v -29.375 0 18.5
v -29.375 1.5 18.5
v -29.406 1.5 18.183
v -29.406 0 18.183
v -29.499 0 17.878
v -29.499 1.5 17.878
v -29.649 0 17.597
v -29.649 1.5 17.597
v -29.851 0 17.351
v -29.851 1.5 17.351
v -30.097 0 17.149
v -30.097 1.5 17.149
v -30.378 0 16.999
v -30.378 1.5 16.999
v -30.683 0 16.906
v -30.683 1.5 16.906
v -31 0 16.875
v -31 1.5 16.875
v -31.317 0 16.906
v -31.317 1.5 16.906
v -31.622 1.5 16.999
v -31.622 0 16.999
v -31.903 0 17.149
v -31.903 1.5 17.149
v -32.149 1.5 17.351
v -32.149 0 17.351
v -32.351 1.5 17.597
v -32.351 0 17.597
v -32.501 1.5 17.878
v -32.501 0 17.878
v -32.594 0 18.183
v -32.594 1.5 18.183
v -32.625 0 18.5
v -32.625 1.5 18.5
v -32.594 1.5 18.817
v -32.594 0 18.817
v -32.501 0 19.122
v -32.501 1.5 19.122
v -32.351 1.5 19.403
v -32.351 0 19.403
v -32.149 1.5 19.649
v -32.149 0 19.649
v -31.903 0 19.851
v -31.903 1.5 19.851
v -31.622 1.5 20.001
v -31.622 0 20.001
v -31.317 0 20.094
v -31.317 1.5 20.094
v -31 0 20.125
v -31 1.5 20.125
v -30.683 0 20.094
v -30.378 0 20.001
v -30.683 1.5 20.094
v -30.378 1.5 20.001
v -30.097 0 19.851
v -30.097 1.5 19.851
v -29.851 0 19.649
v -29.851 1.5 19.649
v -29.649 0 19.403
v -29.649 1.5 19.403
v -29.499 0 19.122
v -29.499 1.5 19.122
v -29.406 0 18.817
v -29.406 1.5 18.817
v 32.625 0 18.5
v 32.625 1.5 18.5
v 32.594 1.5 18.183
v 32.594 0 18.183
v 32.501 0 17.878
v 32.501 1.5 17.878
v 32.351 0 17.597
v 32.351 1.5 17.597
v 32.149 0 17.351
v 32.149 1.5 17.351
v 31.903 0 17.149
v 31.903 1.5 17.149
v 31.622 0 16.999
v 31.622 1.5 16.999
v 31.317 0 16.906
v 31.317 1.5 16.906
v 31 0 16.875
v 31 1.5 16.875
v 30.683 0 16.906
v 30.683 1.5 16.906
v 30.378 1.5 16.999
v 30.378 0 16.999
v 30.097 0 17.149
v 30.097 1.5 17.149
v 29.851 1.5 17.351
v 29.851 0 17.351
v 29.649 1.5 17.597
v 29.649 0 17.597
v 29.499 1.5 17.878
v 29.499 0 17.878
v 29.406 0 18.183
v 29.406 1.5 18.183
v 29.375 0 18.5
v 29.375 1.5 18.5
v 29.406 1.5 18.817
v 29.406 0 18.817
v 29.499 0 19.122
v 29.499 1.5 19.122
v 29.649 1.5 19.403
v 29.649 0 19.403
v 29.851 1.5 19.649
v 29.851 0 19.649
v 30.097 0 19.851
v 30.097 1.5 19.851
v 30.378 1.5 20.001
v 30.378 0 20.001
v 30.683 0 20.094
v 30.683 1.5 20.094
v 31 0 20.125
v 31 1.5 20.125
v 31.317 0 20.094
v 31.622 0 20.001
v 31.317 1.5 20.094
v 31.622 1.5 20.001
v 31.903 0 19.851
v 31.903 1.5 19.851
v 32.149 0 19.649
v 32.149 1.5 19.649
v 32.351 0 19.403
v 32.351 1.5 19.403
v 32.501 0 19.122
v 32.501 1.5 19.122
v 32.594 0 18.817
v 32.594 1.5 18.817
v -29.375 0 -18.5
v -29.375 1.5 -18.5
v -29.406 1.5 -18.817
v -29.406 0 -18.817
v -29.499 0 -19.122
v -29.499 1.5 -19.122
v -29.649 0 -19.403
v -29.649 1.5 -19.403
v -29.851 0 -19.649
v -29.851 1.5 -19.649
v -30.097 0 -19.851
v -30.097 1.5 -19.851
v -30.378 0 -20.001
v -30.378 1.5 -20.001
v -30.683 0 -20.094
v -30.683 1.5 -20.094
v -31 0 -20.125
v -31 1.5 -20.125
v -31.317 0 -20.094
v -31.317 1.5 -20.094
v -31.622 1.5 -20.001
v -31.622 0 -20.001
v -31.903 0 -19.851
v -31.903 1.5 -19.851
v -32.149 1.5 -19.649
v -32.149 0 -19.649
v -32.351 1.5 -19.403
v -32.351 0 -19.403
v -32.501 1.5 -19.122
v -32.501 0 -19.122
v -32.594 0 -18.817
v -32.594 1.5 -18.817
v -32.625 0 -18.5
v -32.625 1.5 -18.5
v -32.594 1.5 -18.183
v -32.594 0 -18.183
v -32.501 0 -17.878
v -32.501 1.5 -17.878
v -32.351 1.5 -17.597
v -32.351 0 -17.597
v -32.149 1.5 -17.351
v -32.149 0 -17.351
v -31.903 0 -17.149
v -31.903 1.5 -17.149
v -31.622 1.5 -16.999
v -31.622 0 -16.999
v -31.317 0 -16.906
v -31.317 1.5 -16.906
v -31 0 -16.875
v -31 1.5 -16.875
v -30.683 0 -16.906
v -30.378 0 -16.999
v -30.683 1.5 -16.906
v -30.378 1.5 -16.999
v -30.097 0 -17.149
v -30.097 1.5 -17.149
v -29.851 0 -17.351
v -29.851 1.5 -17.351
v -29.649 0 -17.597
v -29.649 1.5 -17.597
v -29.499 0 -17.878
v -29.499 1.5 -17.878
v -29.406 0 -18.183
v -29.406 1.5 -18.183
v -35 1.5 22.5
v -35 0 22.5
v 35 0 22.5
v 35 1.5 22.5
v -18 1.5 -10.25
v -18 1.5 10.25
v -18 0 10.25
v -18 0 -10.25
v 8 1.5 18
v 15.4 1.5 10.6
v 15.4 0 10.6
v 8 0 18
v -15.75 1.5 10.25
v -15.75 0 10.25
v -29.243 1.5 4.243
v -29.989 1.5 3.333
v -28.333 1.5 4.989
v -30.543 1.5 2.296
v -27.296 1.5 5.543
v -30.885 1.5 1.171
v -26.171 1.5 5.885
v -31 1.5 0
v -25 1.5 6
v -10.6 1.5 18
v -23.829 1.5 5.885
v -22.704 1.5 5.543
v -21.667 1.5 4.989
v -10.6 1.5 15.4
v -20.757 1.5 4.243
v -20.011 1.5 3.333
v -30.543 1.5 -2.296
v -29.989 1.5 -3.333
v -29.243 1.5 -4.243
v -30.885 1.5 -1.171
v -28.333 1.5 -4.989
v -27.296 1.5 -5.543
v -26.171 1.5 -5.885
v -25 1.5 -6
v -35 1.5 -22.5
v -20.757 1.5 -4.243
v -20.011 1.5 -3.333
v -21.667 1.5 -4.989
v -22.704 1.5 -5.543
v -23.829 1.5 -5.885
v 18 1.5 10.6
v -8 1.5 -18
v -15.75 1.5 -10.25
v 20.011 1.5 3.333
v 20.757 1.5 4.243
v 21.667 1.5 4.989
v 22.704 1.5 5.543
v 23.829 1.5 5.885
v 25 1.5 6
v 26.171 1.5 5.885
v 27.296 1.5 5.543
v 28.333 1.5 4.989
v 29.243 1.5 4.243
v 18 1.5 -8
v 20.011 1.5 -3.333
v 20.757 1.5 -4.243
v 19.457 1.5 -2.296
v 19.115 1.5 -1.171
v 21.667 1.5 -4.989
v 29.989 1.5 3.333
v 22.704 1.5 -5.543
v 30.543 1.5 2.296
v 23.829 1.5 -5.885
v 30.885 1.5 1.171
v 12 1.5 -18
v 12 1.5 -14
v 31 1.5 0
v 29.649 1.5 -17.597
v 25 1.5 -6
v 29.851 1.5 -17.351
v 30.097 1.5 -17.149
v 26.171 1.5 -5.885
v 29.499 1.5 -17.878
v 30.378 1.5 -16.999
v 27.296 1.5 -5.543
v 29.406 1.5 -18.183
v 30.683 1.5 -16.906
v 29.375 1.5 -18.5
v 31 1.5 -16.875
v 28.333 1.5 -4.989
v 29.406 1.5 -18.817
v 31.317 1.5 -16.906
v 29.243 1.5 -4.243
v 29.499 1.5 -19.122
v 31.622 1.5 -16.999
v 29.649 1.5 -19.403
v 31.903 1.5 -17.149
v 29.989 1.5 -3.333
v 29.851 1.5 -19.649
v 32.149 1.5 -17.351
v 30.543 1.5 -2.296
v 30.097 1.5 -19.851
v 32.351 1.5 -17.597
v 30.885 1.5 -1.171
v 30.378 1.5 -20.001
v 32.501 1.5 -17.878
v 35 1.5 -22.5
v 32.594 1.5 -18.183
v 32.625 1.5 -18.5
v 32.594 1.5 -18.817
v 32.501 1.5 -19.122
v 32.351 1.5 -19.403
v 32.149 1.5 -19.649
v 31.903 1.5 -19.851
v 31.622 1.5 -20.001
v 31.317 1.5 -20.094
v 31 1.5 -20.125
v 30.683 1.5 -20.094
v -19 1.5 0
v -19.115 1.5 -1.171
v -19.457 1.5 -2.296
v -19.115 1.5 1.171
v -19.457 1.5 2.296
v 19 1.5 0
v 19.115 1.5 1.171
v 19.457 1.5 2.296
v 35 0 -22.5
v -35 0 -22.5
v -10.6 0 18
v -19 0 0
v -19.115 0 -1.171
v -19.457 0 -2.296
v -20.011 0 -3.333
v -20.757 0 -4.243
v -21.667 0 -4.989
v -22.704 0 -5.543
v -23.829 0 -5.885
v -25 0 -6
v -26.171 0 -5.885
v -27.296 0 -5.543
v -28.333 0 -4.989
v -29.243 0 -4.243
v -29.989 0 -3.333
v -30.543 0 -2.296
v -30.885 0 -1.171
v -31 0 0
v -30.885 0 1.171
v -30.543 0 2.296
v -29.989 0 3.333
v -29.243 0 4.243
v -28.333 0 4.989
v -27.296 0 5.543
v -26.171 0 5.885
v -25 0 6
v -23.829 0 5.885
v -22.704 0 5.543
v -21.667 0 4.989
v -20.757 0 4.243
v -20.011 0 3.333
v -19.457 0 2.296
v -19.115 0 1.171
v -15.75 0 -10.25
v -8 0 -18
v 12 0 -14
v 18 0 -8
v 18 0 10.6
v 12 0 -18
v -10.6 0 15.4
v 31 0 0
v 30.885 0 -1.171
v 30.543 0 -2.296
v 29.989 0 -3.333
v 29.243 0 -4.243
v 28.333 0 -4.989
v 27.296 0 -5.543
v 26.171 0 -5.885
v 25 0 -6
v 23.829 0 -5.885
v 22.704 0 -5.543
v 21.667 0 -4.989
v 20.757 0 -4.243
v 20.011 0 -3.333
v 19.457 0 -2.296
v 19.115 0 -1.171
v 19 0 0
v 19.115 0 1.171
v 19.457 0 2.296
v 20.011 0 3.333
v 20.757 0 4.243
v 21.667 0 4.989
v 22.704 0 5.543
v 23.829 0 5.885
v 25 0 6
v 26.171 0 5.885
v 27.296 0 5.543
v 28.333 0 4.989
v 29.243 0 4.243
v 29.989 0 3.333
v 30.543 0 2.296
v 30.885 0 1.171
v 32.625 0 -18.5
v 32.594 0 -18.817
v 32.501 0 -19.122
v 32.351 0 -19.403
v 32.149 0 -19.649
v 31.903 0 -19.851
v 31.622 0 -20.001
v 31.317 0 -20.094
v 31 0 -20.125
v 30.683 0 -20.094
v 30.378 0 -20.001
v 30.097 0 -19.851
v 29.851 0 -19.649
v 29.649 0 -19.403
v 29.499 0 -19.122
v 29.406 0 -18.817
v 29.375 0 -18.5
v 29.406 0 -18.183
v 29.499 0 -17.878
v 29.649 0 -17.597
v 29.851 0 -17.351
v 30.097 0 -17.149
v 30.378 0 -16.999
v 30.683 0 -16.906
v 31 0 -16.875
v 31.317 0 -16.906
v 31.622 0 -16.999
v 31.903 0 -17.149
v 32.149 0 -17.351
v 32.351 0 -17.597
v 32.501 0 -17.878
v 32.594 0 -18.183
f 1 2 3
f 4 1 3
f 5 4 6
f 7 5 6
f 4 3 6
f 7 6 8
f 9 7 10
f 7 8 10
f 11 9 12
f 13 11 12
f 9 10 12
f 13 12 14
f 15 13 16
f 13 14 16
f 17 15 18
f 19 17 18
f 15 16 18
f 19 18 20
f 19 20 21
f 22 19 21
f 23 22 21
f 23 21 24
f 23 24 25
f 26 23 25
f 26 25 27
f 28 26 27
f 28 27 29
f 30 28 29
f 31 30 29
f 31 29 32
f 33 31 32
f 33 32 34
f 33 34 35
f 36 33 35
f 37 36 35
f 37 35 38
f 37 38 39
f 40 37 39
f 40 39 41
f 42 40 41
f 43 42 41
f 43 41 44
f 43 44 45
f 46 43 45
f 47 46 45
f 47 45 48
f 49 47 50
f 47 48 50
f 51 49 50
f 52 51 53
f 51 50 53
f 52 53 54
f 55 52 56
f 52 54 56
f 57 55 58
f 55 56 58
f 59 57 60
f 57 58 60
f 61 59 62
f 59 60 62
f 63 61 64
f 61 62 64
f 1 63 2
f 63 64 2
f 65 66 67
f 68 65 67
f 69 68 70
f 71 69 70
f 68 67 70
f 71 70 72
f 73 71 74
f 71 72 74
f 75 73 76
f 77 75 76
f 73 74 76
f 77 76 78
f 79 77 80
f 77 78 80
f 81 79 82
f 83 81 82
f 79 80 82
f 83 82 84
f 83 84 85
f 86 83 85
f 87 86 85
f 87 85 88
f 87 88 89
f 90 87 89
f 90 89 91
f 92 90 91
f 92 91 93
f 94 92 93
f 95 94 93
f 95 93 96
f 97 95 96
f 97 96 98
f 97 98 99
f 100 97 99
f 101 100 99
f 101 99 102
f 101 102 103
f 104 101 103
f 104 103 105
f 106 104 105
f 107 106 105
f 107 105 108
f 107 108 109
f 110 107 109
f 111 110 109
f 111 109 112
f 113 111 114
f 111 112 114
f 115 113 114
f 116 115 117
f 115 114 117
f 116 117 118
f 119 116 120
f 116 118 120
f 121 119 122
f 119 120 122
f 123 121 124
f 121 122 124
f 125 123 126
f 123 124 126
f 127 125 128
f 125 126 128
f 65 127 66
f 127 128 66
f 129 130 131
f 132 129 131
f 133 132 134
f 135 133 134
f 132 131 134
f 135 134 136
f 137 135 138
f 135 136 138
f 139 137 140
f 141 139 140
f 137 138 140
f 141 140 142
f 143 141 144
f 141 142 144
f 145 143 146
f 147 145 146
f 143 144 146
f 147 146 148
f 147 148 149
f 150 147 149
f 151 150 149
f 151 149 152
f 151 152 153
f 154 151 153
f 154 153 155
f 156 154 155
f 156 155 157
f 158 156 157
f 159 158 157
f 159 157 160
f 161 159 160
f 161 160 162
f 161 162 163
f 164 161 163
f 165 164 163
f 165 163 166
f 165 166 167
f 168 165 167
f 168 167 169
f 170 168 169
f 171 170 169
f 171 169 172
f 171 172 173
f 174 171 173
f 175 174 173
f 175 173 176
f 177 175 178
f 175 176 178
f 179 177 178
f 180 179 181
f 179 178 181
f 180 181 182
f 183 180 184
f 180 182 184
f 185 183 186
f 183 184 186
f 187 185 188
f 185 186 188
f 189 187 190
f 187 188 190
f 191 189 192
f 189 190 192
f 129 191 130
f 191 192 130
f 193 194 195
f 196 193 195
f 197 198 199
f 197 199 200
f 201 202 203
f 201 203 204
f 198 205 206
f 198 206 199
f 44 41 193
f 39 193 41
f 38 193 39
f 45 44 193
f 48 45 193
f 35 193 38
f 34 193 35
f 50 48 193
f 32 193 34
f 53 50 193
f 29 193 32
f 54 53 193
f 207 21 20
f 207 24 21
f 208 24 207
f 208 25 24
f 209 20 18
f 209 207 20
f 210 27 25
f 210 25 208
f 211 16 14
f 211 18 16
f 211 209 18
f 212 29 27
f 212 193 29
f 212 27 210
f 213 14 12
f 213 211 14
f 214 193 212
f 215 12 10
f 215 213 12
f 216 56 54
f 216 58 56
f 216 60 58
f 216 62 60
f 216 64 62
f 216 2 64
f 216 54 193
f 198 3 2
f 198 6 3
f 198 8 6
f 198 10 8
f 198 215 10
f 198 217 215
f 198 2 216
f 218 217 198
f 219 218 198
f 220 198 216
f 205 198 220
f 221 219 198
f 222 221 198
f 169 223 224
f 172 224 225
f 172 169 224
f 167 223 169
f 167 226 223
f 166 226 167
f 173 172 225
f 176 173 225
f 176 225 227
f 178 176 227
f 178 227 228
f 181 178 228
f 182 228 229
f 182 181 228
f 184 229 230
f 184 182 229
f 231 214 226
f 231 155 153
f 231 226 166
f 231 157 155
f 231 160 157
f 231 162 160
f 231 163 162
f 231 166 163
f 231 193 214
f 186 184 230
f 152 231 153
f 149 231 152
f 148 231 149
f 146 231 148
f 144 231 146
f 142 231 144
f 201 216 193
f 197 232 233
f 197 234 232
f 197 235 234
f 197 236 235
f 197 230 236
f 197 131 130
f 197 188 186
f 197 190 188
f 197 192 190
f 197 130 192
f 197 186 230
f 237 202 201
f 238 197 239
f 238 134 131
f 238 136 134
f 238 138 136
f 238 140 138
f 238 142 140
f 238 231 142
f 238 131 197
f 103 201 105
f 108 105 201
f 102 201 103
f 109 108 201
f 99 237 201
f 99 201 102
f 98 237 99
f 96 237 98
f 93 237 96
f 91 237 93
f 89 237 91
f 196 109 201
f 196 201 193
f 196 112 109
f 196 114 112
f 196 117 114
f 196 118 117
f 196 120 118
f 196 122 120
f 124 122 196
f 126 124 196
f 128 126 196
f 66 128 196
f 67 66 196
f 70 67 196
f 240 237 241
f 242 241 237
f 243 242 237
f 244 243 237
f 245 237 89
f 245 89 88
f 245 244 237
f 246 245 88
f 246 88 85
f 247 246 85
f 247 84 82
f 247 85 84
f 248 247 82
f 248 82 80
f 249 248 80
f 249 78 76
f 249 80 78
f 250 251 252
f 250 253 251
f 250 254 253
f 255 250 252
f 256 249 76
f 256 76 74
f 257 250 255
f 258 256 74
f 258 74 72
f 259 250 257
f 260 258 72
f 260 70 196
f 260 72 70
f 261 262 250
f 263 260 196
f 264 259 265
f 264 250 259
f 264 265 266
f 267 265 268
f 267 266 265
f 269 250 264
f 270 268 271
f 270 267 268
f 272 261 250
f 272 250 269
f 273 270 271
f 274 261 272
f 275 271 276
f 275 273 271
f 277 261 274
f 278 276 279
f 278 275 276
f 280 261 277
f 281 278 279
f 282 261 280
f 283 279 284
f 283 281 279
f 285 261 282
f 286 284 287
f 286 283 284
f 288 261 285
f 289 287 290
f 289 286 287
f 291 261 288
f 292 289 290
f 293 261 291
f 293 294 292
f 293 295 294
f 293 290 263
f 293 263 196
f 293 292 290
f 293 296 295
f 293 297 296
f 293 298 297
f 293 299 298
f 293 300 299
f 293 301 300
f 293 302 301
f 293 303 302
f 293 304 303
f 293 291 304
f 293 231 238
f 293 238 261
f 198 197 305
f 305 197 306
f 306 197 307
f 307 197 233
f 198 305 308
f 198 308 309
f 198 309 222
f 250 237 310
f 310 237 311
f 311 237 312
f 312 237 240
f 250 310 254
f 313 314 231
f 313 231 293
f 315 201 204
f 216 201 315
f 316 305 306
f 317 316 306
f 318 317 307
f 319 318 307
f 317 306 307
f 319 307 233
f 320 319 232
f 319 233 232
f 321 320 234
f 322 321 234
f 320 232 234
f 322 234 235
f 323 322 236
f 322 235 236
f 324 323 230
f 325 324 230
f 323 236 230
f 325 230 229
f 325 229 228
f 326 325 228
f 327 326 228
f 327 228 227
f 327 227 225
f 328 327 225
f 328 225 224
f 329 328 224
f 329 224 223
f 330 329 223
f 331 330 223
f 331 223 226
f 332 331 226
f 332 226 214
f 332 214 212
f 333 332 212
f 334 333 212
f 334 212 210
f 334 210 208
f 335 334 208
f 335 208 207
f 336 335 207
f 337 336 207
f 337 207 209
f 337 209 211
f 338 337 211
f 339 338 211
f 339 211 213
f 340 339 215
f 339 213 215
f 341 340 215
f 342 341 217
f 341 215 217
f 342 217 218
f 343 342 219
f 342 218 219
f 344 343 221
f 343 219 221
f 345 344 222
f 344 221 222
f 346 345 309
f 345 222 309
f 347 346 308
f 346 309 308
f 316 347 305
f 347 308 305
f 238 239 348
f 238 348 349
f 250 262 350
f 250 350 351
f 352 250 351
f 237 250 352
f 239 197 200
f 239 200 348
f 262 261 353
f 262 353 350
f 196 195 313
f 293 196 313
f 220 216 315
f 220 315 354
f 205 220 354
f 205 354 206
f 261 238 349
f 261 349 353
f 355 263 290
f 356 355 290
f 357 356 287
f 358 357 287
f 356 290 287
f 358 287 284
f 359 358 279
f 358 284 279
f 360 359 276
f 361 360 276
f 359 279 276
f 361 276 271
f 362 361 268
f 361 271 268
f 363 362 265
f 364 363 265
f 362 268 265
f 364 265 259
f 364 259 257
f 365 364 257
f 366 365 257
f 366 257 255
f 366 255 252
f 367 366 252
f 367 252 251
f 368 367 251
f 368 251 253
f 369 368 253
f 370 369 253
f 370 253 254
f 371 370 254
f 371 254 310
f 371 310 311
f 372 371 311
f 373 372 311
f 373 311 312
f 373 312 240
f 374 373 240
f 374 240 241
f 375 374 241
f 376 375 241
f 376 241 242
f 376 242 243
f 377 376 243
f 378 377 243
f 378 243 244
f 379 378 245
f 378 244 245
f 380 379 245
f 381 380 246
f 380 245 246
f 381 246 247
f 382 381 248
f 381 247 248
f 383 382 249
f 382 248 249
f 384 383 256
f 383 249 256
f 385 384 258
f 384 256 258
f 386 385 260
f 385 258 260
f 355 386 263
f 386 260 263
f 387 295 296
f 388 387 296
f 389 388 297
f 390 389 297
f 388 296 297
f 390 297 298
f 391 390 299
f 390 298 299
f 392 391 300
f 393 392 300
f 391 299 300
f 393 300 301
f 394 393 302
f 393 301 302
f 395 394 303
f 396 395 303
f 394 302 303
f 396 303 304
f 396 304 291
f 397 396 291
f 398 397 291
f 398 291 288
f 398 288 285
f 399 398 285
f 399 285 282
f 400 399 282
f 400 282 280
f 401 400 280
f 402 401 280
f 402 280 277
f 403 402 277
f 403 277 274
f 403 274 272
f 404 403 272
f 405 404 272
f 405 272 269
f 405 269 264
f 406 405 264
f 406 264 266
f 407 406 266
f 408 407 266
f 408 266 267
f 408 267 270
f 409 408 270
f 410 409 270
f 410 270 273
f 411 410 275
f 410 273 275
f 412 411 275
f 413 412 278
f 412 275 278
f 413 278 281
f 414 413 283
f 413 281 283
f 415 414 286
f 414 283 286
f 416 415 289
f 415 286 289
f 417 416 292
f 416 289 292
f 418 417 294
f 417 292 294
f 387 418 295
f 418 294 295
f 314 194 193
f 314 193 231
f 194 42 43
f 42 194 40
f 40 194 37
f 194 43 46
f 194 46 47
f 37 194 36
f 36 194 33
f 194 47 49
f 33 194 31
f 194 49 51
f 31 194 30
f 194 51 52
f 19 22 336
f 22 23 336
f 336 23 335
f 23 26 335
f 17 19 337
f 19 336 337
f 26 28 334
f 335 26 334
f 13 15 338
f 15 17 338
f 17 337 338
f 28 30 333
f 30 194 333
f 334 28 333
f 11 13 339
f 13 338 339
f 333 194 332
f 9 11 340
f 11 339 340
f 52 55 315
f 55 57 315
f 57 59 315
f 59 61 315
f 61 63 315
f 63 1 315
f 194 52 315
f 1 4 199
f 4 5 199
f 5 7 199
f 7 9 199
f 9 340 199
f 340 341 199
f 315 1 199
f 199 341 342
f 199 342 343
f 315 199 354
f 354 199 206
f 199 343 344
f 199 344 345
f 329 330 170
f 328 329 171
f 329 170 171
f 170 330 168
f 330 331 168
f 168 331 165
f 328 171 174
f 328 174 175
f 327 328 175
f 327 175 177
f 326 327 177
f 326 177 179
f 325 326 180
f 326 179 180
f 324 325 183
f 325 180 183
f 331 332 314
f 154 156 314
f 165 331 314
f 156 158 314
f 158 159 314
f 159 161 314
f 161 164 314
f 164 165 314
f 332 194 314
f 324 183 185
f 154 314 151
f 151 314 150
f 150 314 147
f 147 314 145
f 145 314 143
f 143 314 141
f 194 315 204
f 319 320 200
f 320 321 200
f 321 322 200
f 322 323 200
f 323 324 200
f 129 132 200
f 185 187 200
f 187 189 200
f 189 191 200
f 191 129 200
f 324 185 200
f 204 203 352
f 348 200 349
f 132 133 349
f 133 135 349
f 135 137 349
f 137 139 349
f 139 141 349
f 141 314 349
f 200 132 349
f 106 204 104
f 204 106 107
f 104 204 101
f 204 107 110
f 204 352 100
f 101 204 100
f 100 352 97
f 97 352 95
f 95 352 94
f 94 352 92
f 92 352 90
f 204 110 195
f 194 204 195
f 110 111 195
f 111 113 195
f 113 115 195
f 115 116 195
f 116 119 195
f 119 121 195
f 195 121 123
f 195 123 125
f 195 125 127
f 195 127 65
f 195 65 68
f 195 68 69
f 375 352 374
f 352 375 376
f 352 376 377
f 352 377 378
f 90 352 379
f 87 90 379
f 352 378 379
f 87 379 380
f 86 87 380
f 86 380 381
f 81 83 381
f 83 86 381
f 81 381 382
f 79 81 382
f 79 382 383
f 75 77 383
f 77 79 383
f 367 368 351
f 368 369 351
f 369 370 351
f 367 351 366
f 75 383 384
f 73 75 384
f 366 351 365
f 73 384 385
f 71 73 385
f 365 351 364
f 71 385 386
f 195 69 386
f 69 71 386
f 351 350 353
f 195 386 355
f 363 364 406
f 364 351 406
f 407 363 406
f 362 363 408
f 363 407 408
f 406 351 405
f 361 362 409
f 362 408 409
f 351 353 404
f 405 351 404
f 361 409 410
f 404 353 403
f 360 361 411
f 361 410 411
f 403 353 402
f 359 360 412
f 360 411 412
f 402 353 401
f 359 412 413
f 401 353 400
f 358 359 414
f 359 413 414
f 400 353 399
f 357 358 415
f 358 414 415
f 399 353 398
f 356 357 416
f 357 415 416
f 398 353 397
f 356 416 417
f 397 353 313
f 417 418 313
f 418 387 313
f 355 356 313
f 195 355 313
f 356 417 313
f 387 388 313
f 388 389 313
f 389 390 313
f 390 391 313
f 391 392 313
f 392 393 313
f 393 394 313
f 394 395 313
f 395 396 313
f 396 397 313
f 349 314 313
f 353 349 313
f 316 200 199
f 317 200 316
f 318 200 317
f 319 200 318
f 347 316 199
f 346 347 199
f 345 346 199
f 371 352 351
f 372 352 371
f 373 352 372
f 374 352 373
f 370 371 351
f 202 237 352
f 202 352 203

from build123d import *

# Parameters (mm, degrees)
SKETCH2_W           = 70
SKETCH2_H           = 45
BOSS_EXTRUDE1_DEPTH = 1.5
SKETCH3_R           = 1.625
SKETCH3_R_2         = 6
CUT_EXTRUDE1_DEPTH  = 2.5
CUT_EXTRUDE2_DEPTH  = 2.5


with BuildPart() as part:
    # Sketch2 → Boss-Extrude1 (new body)
    with BuildSketch(Plane(origin=(0, 0, 0), x_dir=(1, 0, 0), z_dir=(0, 1, 0))):
        Rectangle(SKETCH2_W, SKETCH2_H)
    extrude(amount=BOSS_EXTRUDE1_DEPTH)

    # Sketch3 → Cut-Extrude1 (cut, through all)
    with BuildSketch(Plane(origin=(0, 1.5, 0), x_dir=(1, 0, 0), z_dir=(0, 1, 0))):
        with Locations((-31, -18.5)):
            Circle(SKETCH3_R)
        with Locations((-31, 18.5)):
            Circle(SKETCH3_R)
        with Locations((31, 18.5)):
            Circle(SKETCH3_R)
        with Locations((31, -18.5)):
            Circle(SKETCH3_R)
        with Locations((-25, 0)):
            Circle(SKETCH3_R_2)
        with Locations((25, 0)):
            Circle(SKETCH3_R_2)
    extrude(amount=-CUT_EXTRUDE1_DEPTH, mode=Mode.SUBTRACT)

    # Sketch4 → Cut-Extrude2 (cut, through all)
    with BuildSketch(Plane(origin=(0, 1.5, 0), x_dir=(1, 0, 0), z_dir=(0, 1, 0))):
        Polygon((-10.6, -18), (-10.6, -15.4), (-15.75, -10.25), (-18, -10.25), (-18, 10.25), (-15.75, 10.25), (-8, 18), (12, 18), (12, 14), (18, 8), (18, -10.6), (15.4, -10.6), (8, -18), align=None)
    extrude(amount=-CUT_EXTRUDE2_DEPTH, mode=Mode.SUBTRACT)


solid = part.part
